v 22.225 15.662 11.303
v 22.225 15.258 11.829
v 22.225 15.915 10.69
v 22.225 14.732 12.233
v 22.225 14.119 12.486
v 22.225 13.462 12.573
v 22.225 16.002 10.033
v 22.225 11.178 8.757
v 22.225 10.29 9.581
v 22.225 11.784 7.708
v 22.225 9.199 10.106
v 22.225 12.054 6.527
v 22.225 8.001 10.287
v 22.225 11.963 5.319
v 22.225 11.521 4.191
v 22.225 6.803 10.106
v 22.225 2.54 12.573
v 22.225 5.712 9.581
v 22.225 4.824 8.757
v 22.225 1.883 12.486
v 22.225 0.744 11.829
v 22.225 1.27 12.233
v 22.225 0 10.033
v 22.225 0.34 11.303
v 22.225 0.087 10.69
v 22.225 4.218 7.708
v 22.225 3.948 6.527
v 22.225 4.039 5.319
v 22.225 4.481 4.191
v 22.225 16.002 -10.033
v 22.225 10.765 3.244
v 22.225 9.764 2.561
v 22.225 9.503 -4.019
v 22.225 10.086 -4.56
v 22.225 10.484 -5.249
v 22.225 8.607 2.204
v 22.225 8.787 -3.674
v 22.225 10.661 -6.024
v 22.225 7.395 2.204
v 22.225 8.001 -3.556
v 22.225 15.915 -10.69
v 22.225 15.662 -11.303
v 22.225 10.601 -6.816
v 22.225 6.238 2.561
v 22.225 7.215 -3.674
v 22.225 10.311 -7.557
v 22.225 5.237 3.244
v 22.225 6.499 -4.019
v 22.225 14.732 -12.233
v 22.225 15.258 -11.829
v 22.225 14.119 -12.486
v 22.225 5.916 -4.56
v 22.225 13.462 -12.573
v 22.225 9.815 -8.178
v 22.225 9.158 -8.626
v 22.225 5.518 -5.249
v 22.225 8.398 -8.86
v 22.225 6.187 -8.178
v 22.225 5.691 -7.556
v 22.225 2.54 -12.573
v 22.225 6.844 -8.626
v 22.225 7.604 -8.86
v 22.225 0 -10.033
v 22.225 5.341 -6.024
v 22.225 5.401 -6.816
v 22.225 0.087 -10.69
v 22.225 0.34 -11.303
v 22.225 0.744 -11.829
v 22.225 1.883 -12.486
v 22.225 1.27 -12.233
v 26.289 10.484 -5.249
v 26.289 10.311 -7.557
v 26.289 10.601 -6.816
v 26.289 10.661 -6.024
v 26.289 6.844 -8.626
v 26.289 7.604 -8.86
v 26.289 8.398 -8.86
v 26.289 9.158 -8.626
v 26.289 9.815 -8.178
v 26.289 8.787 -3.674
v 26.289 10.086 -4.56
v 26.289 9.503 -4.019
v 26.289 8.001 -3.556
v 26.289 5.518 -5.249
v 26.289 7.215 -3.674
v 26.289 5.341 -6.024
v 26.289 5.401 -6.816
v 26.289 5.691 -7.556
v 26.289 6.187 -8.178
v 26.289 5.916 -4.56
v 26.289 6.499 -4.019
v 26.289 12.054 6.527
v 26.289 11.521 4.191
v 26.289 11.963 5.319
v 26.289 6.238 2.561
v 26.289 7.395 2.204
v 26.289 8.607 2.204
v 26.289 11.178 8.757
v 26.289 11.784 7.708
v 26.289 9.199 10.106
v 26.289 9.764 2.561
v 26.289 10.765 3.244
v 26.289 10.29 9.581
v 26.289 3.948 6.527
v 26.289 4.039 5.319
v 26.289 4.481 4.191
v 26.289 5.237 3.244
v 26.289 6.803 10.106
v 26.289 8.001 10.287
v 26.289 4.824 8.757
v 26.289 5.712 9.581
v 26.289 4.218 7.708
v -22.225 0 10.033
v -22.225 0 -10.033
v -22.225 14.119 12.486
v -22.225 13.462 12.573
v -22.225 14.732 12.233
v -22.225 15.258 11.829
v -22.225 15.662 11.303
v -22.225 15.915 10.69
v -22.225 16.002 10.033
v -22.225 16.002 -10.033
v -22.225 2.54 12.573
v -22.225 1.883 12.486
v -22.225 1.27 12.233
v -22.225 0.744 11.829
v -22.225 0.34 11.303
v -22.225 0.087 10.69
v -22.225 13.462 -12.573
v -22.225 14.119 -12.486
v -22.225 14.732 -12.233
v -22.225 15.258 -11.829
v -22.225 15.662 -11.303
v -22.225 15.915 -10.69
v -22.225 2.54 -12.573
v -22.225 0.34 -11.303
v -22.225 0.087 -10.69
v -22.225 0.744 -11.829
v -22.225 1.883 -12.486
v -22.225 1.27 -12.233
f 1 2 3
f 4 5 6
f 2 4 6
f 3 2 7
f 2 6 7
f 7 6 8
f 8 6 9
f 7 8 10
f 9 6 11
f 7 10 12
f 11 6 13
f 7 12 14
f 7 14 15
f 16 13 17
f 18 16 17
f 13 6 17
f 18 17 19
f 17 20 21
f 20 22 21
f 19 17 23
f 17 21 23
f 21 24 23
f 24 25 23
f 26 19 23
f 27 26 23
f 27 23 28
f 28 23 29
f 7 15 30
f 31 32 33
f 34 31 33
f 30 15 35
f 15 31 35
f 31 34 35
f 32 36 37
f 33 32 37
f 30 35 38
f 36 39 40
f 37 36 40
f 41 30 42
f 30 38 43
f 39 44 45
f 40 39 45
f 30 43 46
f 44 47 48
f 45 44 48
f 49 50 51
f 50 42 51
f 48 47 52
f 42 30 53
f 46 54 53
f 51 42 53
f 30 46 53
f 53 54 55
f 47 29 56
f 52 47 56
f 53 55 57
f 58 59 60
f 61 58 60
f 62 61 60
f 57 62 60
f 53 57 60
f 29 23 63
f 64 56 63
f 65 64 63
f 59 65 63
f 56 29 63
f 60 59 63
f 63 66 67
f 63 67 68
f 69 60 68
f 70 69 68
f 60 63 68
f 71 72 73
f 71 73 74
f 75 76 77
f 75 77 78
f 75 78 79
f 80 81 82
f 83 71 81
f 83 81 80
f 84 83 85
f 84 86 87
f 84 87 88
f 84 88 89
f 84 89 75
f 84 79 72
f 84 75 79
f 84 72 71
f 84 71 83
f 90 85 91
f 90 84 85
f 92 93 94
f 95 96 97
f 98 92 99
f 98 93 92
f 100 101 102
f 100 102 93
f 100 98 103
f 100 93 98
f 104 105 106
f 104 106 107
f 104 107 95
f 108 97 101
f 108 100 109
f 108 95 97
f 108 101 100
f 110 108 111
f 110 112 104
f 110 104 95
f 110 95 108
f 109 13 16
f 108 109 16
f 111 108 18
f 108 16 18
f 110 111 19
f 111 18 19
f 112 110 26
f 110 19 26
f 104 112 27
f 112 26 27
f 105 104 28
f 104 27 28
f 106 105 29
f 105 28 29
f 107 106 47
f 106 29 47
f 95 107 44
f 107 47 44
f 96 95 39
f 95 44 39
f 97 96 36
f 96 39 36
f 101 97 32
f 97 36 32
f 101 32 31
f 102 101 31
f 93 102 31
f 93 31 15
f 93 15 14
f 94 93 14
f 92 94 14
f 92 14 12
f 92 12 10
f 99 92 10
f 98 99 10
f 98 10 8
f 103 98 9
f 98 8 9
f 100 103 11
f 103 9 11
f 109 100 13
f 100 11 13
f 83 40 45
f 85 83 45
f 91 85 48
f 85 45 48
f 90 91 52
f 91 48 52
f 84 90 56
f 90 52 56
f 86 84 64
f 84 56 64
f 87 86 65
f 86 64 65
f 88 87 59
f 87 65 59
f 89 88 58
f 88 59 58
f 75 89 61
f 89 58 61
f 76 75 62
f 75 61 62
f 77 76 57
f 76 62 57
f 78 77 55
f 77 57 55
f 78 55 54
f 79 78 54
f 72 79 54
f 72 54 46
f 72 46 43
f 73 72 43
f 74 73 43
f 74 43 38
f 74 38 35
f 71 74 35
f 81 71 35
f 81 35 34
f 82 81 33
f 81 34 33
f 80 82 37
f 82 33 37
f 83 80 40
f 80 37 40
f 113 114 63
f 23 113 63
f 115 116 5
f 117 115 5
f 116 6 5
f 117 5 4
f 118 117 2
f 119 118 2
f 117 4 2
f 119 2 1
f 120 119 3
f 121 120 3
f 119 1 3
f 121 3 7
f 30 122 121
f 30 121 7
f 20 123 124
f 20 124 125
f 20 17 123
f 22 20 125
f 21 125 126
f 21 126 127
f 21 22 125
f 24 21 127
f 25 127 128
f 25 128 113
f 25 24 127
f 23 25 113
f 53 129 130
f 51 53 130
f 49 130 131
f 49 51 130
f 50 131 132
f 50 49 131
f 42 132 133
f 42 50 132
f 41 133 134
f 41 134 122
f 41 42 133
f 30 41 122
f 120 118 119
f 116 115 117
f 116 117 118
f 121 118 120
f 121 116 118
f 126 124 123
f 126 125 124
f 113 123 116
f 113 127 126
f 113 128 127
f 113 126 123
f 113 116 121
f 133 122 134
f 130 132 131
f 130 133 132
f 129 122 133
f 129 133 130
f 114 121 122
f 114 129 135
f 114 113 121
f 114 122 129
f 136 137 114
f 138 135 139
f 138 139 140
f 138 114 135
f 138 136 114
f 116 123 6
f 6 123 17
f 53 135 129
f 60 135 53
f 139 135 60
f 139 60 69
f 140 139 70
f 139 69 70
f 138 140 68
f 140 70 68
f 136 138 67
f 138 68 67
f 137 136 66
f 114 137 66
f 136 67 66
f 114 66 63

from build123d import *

# Parameters (mm, degrees)
SKETCH1_W           = 44.45
SKETCH1_H           = 25.146
BOSS_EXTRUDE1_DEPTH = 16.002
FILLET1_R           = 2.54
SKETCH2_R           = 4.064
SKETCH2_R_2         = 2.667
BOSS_EXTRUDE2_DEPTH = 4.064


with BuildPart() as part:
    # Sketch1 → Boss-Extrude1 (new body)
    with BuildSketch(Plane(origin=(0, 0, 0), x_dir=(1, 0, 0), z_dir=(0, 1, 0))):
        Rectangle(SKETCH1_W, SKETCH1_H)
    extrude(amount=BOSS_EXTRUDE1_DEPTH)

    # Fillet1
    fillet1_edges = [part.edges().sort_by_distance(p)[0] for p in [
        (0, 16.002, 12.573),
        (0, 0, 12.573),
        (0, 0, -12.573),
        (0, 16.002, -12.573),
    ]]
    fillet(fillet1_edges, radius=FILLET1_R)

    # Sketch2 → Boss-Extrude2 (add)
    with BuildSketch(Plane(origin=(22.225, 0, 0), x_dir=(0, 0, -1), z_dir=(1, 0, 0))):
        with Locations(Location((-6.223, 8.001, 0), (0, 0, 180))):
            Circle(SKETCH2_R)
        with Locations(Location((6.223, 8.001, 0), (0, 0, 180))):
            Circle(SKETCH2_R_2)
    extrude(amount=BOSS_EXTRUDE2_DEPTH)


solid = part.part
